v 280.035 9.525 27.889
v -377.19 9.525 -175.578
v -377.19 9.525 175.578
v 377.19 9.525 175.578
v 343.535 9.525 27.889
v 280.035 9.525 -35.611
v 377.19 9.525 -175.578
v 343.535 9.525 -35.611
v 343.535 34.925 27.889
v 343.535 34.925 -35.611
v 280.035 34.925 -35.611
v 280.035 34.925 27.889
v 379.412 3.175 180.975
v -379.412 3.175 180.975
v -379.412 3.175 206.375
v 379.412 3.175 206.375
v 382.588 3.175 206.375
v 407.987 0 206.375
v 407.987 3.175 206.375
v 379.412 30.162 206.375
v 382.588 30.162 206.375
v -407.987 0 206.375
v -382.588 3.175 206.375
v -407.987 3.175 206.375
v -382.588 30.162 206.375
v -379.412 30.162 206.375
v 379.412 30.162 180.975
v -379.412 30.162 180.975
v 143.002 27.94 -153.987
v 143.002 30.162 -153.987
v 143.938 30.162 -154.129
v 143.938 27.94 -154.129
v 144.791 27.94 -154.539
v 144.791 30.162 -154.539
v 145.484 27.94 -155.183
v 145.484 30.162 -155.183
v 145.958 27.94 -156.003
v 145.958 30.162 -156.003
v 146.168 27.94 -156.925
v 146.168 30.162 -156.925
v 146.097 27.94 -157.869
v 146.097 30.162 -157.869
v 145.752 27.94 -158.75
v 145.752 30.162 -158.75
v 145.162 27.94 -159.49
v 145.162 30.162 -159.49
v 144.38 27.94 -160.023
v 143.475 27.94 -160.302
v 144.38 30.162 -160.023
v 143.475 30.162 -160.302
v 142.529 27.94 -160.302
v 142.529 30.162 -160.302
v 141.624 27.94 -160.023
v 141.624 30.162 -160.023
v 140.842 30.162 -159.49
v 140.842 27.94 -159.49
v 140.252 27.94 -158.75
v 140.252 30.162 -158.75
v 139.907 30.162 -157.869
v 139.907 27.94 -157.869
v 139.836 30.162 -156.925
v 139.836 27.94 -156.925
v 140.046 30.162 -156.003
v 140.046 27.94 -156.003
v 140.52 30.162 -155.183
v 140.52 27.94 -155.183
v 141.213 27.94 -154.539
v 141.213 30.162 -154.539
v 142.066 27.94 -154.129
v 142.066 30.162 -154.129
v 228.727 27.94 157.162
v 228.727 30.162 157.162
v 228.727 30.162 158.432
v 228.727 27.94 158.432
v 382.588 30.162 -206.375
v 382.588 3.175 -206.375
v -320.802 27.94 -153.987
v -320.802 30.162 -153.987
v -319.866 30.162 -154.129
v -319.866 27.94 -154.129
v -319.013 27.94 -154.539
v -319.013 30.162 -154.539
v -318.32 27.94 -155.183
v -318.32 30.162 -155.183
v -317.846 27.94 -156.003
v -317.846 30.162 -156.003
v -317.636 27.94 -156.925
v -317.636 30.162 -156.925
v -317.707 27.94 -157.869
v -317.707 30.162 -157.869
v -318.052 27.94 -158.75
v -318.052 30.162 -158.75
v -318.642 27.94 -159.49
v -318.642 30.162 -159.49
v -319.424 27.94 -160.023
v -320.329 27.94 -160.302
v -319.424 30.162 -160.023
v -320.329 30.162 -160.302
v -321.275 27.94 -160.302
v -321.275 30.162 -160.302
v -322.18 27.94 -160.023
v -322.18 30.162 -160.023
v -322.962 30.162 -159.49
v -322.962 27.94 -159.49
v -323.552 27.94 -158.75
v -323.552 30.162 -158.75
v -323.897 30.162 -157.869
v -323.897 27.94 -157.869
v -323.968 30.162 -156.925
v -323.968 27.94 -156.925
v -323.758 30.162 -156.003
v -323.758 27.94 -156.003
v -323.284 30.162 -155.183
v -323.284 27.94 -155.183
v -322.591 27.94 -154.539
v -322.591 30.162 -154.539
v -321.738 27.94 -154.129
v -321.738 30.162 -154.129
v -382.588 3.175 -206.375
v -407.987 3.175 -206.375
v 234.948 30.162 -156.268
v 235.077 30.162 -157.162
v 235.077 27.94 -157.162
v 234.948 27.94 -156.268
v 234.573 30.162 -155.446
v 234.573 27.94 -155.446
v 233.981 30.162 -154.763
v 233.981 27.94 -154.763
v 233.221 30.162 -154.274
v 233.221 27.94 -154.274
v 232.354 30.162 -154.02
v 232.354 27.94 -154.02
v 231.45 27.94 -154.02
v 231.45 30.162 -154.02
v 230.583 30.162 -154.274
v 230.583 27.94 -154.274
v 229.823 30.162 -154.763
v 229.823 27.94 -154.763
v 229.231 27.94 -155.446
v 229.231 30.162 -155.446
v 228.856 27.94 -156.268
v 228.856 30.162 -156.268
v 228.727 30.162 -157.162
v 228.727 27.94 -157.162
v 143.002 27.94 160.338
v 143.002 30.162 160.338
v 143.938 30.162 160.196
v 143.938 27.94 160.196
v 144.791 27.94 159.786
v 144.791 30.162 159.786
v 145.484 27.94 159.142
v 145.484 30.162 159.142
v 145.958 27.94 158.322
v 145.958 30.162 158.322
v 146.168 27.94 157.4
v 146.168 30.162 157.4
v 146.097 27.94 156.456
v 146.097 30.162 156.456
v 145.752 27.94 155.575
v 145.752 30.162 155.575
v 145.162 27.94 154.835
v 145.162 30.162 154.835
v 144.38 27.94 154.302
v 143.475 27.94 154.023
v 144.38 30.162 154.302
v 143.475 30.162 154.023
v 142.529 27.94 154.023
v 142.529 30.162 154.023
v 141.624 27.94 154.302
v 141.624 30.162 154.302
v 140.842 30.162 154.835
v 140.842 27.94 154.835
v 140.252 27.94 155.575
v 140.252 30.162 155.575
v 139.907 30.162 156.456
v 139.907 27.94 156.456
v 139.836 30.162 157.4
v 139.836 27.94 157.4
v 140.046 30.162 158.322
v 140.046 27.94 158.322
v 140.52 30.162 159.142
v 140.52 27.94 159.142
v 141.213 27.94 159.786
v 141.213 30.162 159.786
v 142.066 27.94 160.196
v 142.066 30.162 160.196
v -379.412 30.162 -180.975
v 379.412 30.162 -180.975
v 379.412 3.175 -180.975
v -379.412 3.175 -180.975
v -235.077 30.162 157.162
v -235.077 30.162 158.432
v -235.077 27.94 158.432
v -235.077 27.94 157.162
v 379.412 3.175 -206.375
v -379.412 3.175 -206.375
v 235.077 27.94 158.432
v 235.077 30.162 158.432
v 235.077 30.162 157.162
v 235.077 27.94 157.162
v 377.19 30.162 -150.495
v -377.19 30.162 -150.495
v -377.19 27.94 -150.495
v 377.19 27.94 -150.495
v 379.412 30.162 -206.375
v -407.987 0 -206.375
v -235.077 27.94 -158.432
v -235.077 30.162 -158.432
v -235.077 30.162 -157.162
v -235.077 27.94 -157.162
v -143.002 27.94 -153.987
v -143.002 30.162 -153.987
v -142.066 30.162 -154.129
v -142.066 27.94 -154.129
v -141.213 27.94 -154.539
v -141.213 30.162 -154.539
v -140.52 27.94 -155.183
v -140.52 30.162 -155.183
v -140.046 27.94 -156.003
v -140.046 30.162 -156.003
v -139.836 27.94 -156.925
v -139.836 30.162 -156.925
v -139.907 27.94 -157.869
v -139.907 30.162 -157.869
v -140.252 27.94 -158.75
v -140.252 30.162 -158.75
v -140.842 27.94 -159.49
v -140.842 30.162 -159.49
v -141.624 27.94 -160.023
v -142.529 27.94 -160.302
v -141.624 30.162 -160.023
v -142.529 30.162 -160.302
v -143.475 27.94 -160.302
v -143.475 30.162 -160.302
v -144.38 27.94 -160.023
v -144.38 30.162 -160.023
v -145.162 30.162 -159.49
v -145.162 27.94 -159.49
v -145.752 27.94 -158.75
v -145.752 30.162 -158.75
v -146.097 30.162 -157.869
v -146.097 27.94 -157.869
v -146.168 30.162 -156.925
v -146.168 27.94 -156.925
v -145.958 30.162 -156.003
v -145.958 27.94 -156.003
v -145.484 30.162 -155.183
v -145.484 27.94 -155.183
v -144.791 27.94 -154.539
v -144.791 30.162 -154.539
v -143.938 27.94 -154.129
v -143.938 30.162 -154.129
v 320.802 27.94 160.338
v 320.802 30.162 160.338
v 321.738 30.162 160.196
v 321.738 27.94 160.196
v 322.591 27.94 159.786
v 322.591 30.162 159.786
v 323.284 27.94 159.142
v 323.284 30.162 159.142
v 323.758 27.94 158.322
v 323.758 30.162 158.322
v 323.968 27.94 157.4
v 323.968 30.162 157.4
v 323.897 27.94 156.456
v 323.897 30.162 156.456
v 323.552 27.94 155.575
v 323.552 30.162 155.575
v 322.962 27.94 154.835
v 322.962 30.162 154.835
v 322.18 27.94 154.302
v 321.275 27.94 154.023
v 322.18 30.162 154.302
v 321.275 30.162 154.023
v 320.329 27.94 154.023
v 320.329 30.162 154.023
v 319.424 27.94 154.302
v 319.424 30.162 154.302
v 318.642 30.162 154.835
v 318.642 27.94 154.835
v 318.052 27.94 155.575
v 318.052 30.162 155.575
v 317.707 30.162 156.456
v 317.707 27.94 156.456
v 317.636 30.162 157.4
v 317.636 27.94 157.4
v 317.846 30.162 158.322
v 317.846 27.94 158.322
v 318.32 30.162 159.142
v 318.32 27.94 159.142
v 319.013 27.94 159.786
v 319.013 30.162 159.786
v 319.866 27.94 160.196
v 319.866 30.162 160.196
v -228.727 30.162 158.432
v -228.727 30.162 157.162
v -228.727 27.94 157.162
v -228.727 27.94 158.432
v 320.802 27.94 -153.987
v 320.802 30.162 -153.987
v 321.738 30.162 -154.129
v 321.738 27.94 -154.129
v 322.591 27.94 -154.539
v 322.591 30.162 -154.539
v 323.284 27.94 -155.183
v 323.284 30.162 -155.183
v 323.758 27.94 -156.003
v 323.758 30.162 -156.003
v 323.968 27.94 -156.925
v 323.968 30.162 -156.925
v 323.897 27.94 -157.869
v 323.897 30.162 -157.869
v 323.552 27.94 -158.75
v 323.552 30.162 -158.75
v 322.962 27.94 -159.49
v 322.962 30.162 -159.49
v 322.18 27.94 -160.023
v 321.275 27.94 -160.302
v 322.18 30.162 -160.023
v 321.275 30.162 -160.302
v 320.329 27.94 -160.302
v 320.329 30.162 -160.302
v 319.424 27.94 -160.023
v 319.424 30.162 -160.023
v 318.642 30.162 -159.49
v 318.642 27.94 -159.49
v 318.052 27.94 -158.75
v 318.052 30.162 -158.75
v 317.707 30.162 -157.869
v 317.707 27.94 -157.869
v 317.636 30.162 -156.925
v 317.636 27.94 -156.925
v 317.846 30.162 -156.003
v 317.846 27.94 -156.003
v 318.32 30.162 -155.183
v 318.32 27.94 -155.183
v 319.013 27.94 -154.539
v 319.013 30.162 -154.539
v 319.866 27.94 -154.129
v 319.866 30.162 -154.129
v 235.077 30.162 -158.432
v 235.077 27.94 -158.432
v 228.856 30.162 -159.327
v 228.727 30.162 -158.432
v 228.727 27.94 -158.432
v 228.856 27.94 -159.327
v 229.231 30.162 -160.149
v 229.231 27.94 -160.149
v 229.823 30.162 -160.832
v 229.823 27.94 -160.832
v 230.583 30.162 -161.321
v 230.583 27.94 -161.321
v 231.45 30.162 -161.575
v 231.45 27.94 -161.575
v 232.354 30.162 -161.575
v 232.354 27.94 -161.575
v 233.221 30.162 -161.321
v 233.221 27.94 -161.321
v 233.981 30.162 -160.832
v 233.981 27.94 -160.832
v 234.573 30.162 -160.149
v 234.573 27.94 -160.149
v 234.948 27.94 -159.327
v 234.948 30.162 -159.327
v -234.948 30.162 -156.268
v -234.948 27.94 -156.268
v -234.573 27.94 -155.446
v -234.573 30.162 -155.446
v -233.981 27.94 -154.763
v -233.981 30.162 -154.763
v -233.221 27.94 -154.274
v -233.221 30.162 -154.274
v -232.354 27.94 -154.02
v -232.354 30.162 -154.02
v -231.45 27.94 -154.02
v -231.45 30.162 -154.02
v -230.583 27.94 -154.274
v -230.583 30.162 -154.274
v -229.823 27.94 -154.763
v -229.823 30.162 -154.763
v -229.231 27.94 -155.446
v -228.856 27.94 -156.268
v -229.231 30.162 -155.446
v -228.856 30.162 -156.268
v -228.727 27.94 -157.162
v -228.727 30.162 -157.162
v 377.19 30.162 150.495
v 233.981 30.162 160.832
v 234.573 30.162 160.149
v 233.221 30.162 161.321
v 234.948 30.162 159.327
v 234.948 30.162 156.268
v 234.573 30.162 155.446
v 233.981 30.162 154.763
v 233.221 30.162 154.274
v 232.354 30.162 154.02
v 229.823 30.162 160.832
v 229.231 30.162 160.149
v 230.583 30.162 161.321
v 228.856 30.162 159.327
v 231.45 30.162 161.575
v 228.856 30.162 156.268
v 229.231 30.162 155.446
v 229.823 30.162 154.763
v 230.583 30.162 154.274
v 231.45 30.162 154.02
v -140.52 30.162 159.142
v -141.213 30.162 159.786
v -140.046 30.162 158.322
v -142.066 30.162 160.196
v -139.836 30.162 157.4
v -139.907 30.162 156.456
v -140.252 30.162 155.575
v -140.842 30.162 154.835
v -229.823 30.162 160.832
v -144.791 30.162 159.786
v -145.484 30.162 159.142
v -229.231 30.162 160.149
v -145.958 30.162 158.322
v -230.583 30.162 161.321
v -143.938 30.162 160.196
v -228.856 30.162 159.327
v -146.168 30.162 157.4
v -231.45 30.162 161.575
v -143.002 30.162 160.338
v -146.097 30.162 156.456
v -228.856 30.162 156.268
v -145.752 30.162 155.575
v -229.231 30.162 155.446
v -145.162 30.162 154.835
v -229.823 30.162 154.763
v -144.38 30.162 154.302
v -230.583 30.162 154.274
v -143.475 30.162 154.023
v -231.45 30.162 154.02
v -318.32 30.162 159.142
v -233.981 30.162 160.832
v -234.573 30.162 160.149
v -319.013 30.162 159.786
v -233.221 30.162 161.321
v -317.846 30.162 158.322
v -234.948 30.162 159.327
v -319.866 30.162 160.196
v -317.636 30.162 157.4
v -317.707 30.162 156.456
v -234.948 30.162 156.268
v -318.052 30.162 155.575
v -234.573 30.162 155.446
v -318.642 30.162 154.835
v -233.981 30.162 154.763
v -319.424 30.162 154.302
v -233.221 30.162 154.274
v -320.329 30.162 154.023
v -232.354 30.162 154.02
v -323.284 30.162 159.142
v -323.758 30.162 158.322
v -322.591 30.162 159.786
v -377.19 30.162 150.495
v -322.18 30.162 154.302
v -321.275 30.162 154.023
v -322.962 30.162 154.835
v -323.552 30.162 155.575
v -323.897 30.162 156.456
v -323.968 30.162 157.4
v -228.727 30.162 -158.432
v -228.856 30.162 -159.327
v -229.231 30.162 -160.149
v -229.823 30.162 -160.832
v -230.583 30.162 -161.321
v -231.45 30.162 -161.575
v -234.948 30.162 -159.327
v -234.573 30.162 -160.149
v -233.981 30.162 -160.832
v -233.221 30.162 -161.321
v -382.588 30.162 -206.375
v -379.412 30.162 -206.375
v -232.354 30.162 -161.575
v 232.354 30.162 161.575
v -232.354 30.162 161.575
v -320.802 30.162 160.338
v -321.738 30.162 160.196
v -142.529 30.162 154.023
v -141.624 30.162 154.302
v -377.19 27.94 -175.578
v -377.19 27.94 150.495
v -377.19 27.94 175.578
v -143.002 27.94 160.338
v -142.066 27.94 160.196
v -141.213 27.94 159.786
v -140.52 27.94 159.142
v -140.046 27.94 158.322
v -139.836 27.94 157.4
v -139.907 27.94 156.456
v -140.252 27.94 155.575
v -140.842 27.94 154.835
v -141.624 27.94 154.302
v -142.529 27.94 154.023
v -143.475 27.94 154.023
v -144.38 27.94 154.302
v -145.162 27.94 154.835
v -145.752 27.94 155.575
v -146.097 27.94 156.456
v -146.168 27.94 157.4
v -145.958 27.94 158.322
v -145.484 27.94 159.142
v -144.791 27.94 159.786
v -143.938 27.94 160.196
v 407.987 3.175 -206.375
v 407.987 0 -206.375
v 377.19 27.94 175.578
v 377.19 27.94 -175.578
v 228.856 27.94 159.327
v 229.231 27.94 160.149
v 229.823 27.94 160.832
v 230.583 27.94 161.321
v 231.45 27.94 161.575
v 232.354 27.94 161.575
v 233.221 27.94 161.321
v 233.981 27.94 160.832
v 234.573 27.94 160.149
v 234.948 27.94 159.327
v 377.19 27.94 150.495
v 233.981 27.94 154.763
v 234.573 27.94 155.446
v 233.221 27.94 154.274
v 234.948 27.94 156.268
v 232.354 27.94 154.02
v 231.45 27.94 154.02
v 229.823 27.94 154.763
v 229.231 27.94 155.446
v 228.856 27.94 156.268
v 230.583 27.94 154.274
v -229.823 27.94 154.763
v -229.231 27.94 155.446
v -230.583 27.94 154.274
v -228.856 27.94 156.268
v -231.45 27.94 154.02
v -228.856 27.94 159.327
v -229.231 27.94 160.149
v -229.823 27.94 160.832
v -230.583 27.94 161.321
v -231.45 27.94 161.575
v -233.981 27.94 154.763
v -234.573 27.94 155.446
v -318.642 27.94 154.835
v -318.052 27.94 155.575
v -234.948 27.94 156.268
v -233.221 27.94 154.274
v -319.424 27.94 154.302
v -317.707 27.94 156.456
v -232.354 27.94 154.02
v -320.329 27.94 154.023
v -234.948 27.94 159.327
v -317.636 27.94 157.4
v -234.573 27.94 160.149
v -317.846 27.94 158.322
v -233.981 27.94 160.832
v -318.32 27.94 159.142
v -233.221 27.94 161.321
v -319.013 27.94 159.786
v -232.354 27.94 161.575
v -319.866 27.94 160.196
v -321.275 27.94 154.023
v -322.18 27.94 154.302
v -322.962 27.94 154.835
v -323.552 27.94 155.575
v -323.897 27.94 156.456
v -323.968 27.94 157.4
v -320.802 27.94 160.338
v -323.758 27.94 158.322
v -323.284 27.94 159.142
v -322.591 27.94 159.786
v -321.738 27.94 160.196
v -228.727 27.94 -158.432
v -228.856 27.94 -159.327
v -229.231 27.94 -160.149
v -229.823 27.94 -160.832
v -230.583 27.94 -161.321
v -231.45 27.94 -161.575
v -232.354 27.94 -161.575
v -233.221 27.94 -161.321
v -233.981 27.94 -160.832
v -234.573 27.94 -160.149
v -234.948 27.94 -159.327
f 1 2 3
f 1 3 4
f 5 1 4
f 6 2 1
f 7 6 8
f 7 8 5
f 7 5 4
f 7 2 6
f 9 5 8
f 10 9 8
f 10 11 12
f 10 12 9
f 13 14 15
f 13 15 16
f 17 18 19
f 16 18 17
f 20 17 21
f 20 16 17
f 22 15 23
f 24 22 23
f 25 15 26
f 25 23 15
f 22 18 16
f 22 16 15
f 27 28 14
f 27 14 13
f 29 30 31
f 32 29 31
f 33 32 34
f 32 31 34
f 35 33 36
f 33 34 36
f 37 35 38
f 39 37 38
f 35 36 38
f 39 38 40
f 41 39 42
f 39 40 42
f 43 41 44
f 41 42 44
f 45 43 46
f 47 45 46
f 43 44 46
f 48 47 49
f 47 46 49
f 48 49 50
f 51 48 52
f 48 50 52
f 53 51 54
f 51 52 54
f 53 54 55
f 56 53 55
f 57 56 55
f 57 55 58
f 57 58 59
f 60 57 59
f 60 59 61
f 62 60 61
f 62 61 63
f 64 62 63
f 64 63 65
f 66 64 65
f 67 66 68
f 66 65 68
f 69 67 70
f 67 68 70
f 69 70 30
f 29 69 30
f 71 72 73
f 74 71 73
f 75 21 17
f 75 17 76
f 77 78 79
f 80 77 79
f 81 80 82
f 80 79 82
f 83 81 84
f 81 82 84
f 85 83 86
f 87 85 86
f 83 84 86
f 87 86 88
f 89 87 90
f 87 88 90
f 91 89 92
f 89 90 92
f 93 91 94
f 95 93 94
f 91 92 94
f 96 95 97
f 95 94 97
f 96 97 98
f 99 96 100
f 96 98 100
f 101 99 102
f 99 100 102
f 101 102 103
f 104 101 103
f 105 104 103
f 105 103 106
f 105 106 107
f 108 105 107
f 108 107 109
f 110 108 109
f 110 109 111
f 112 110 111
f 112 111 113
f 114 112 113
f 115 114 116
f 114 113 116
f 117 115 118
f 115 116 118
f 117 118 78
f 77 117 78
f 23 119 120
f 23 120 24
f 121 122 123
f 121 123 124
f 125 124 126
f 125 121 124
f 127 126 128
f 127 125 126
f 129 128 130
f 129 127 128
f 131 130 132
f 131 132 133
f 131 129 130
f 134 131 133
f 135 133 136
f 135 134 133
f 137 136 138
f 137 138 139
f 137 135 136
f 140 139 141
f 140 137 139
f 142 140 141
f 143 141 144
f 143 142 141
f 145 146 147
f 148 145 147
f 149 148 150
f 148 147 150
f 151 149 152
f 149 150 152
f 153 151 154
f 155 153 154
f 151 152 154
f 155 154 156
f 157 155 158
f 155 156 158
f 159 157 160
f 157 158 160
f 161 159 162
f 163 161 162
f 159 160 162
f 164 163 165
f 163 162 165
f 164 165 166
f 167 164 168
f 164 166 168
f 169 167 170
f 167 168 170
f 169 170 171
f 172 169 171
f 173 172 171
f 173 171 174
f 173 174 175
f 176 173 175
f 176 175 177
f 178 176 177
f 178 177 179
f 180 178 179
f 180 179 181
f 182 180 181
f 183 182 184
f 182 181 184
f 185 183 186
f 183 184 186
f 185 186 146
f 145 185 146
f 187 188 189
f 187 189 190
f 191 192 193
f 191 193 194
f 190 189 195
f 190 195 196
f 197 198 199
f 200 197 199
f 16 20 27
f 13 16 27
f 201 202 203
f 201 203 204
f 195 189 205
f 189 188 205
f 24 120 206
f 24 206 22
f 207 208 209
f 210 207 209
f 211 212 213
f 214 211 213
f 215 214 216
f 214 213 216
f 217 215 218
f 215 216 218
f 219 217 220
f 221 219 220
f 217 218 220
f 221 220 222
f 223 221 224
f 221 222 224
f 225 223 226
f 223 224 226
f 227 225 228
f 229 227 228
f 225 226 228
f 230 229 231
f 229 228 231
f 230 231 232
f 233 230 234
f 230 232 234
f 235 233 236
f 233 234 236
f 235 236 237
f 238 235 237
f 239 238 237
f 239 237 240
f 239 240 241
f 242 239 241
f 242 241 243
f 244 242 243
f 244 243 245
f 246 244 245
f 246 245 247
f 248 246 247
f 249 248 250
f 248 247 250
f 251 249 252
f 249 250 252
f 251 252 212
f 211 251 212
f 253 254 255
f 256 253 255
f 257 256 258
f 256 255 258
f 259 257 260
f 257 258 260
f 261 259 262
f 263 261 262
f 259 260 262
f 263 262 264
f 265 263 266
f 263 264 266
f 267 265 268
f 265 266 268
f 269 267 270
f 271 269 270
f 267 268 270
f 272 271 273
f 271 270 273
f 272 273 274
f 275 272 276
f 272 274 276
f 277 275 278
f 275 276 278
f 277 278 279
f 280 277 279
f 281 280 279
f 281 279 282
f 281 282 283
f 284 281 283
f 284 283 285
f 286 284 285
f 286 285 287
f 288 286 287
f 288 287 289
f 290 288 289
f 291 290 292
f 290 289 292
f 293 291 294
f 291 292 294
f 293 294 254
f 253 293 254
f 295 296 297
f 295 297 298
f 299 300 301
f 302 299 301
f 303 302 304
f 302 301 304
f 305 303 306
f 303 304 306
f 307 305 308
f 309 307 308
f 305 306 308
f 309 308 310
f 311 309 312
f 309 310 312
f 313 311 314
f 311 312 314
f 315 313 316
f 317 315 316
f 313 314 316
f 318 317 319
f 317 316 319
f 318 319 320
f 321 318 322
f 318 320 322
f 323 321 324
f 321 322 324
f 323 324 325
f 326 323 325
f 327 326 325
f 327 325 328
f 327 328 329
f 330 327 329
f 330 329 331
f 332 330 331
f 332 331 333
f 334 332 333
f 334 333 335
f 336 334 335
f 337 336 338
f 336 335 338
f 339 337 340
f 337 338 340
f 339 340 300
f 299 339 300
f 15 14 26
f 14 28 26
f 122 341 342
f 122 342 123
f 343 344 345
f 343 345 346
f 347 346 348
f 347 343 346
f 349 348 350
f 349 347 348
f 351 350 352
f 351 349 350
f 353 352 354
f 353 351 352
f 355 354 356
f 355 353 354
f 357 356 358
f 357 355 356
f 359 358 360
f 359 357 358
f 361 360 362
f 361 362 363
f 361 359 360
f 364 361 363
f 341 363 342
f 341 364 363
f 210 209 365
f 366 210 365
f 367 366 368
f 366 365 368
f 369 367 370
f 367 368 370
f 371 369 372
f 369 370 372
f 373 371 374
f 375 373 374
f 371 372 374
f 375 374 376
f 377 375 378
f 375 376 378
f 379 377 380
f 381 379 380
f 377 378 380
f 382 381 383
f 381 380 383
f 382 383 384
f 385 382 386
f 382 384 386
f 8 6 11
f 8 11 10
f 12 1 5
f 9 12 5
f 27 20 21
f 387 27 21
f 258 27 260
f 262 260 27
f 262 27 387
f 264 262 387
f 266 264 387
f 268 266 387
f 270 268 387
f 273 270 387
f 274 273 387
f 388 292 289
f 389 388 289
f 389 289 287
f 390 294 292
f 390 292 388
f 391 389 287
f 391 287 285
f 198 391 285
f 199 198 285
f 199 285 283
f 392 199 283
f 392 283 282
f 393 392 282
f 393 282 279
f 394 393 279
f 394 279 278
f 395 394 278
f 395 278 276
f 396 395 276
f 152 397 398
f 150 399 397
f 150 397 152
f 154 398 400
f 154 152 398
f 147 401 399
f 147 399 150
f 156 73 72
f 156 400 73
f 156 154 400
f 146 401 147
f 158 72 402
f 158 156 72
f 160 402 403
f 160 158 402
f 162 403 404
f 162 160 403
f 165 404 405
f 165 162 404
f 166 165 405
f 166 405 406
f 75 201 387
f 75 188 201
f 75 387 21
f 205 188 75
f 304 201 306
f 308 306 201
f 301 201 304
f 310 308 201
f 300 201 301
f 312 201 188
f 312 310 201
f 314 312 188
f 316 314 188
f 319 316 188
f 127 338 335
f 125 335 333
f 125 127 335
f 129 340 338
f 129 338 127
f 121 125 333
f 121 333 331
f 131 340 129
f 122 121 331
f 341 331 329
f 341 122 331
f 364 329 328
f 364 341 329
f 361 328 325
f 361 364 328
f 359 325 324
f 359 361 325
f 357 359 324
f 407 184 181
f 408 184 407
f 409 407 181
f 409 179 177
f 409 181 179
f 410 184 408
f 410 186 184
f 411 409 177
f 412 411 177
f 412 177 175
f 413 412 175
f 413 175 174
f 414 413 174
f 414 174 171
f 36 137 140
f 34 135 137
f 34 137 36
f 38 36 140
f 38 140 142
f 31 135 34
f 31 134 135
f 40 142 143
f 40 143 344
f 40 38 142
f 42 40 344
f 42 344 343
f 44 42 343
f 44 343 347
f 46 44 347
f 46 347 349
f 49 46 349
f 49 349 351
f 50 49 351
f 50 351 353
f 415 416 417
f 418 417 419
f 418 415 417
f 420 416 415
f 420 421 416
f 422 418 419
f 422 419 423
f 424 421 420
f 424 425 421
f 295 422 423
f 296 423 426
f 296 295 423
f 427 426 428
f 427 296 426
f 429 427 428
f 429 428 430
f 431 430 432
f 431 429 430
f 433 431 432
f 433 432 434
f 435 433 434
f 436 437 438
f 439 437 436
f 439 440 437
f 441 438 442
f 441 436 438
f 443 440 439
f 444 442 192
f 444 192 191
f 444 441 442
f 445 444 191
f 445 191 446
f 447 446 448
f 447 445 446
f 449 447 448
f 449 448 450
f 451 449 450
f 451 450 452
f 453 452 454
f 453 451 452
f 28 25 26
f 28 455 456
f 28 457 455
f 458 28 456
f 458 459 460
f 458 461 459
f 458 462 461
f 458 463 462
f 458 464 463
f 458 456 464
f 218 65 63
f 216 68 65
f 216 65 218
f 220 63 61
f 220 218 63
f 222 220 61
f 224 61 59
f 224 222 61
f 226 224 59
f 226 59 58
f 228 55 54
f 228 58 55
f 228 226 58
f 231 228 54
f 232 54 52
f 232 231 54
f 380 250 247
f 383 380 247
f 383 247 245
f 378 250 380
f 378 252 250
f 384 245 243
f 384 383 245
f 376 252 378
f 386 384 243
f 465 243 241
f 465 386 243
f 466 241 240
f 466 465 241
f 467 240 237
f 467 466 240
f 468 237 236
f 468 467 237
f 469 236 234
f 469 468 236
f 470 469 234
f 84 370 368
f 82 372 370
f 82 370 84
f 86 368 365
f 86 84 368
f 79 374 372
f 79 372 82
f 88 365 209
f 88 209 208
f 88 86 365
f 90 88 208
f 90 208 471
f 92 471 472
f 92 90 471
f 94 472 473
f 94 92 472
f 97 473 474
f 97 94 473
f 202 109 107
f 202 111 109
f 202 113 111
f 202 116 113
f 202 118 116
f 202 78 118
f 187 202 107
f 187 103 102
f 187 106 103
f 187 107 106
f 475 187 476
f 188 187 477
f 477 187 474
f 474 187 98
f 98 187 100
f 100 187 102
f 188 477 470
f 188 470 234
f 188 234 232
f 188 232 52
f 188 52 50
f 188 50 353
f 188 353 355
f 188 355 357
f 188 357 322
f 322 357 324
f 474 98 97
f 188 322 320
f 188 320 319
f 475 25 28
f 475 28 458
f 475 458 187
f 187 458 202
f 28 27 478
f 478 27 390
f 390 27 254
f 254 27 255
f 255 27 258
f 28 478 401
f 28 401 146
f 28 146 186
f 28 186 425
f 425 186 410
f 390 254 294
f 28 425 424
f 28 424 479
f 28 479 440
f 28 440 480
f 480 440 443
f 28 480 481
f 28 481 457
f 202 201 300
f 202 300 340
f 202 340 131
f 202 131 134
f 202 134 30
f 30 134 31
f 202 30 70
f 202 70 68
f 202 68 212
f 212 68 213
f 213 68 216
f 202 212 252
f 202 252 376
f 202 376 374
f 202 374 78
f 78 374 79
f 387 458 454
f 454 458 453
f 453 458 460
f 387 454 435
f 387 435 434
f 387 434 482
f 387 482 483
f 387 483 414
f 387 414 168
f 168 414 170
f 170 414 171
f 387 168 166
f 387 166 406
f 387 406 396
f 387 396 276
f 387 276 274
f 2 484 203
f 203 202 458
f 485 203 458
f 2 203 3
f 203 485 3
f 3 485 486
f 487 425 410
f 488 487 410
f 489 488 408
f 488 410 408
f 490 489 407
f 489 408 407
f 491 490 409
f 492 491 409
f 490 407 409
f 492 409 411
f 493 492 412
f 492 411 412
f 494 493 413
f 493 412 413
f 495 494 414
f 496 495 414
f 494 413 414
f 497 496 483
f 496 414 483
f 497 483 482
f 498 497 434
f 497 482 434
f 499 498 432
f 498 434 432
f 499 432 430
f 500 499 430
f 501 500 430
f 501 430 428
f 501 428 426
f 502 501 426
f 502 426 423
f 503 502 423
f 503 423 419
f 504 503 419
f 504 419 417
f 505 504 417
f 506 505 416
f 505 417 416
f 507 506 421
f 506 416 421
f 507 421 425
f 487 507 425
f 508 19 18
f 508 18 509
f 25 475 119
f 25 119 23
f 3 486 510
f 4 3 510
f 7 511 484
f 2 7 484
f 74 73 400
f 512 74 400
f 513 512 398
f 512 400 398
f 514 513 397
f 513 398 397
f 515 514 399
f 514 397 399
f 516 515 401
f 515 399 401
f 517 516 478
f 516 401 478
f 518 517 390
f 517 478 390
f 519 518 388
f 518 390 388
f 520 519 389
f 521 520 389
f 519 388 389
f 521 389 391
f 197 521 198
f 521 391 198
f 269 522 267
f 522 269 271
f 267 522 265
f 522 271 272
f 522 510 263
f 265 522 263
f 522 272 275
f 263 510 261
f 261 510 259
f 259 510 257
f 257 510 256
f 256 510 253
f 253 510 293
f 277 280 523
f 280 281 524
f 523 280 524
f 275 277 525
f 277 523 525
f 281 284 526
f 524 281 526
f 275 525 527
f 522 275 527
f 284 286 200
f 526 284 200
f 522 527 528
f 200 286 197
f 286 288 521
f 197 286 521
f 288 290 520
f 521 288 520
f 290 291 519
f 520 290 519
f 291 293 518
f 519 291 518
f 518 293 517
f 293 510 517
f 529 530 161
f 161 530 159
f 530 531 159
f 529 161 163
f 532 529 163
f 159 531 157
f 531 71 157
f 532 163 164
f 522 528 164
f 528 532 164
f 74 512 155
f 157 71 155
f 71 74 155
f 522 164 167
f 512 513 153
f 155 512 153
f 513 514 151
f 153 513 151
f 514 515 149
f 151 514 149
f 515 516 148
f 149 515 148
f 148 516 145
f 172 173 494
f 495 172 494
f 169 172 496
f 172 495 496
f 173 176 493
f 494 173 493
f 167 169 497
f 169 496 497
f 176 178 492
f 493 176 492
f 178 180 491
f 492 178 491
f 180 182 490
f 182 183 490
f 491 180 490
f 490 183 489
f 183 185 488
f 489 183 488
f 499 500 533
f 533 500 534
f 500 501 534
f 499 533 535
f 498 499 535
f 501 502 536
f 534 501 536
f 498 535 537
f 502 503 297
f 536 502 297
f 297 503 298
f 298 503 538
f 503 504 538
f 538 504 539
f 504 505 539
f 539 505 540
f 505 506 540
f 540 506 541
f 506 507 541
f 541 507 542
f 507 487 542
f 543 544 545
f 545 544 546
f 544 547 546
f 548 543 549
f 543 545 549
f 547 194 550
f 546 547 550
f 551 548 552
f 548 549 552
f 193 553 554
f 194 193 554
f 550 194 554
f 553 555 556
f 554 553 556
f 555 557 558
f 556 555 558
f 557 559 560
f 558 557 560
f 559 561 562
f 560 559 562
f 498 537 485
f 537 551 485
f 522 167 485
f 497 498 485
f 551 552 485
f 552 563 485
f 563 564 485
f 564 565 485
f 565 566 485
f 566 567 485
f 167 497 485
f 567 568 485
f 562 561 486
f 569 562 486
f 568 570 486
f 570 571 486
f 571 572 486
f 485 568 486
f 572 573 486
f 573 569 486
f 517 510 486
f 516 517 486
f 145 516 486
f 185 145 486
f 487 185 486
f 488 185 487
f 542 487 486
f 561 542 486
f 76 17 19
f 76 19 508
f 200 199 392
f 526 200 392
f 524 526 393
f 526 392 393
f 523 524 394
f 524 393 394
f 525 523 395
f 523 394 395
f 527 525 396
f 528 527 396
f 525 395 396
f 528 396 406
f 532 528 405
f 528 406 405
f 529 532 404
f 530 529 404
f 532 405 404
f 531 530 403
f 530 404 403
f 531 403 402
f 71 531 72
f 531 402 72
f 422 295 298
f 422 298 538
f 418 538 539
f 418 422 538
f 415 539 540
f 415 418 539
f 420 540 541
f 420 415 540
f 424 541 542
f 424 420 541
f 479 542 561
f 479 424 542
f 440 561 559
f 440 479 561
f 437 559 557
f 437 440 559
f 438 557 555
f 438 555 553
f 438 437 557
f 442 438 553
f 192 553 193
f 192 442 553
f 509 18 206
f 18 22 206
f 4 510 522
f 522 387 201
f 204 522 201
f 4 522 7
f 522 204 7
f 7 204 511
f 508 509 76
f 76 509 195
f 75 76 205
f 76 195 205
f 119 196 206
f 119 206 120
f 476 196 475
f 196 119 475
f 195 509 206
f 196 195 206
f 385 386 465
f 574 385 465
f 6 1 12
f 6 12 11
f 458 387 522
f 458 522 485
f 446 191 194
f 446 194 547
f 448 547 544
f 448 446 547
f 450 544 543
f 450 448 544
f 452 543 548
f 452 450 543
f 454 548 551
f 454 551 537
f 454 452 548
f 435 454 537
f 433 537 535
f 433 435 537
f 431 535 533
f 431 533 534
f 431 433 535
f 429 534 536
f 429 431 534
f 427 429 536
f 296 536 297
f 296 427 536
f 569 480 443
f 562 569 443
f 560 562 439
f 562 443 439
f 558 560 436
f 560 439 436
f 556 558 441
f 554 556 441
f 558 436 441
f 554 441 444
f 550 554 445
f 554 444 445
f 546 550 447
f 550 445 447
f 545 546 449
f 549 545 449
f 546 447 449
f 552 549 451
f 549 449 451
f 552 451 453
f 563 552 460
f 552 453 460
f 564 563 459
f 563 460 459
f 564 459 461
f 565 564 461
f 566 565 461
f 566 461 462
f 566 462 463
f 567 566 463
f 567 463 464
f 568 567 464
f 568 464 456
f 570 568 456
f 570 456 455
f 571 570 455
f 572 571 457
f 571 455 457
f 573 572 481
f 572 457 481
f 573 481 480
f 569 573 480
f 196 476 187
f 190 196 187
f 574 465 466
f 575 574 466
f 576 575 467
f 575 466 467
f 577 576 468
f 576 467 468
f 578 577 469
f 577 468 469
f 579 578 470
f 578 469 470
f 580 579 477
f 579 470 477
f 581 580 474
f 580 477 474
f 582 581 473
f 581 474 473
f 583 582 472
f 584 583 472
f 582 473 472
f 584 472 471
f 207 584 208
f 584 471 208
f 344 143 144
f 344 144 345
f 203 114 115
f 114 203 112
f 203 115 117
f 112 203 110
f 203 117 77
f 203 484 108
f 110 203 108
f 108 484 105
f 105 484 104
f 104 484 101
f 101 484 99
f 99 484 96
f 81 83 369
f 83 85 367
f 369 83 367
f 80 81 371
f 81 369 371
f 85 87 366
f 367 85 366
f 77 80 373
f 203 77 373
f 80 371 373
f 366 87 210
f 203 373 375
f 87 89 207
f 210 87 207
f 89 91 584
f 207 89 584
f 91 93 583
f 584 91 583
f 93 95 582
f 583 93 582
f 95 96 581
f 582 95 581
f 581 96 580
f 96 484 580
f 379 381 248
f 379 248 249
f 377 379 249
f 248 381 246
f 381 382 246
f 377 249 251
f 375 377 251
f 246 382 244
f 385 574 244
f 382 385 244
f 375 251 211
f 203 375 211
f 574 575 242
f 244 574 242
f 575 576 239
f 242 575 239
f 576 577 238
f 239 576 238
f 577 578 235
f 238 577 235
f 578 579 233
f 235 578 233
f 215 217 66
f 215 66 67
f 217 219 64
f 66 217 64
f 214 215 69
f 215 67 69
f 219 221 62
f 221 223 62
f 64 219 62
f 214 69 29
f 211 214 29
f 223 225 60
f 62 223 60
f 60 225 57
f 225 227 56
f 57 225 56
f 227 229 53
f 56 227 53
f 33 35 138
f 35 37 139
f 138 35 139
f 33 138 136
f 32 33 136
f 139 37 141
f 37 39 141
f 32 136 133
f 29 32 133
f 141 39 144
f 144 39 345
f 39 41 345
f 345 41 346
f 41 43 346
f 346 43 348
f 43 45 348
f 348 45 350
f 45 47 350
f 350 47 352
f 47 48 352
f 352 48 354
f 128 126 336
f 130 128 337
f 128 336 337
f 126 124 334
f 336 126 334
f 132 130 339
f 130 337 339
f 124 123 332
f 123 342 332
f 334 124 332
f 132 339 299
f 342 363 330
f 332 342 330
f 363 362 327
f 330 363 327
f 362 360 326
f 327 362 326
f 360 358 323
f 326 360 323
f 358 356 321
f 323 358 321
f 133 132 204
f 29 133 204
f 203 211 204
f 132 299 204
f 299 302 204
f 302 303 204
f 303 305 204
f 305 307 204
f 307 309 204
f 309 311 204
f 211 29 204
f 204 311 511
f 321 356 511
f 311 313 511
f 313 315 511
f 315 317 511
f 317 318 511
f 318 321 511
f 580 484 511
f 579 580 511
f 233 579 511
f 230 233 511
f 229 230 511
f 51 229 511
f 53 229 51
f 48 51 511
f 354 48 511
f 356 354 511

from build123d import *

# Parameters (mm, degrees)
SKETCH1_W            = 754.38
SKETCH1_H            = 351.155
BOSS_EXTRUDE1_DEPTH  = 9.525
SKETCH5_W            = 355.6
SKETCH5_H            = 30.1625
BOSS_EXTRUDE4_DEPTH  = 2.2225
SKETCH6_W            = 754.38
SKETCH6_H            = 30.1625
BOSS_EXTRUDE5_DEPTH  = 2.2225
SKETCH8_W            = 754.38
SKETCH8_H            = 30.1625
BOSS_EXTRUDE6_DEPTH  = 2.2225
SKETCH14_W           = 355.6
SKETCH14_H           = 30.1625
BOSS_EXTRUDE7_DEPTH  = 2.2225
SKETCH16_W           = 754.38
SKETCH16_H           = 2.2225
BOSS_EXTRUDE8_DEPTH  = 25.0825
SKETCH17_W           = 754.38
SKETCH17_H           = 2.2225
BOSS_EXTRUDE9_DEPTH  = 25.0825
CUT_EXTRUDE1_DEPTH   = 2.2225
SKETCH21_R           = 3.175
CUT_EXTRUDE3_DEPTH   = 2.2225
SKETCH22_W           = 758.825
SKETCH22_H           = 30.1625
BOSS_EXTRUDE10_DEPTH = 3.175
SKETCH23_W           = 758.825
SKETCH23_H           = 3.175
BOSS_EXTRUDE11_DEPTH = 25.4
SKETCH24_W           = 758.825
SKETCH24_H           = 30.1625
BOSS_EXTRUDE12_DEPTH = 3.175
SKETCH25_W           = 758.825
SKETCH25_H           = 3.175
BOSS_EXTRUDE13_DEPTH = 25.4
SKETCH26_W           = 412.75
SKETCH26_H           = 30.1625
BOSS_EXTRUDE14_DEPTH = 3.175
SKETCH27_W           = 412.75
SKETCH27_H           = 3.175
BOSS_EXTRUDE15_DEPTH = 25.4
SKETCH28_W           = 412.75
SKETCH28_H           = 30.1625
BOSS_EXTRUDE16_DEPTH = 3.175
SKETCH29_W           = 412.75
SKETCH29_H           = 3.175
BOSS_EXTRUDE17_DEPTH = 25.4
SKETCH30_W           = 63.5
SKETCH30_H           = 63.5
BOSS_EXTRUDE18_DEPTH = 25.4


with BuildPart() as part:
    # Sketch1 → Boss-Extrude1 (new body)
    with BuildSketch(Plane(origin=(0, 0, 0), x_dir=(1, 0, 0), z_dir=(0, 1, 0))):
        Rectangle(SKETCH1_W, SKETCH1_H)
    extrude(amount=BOSS_EXTRUDE1_DEPTH)

    # Sketch5 → Boss-Extrude4 (add)
    with BuildSketch(Plane.ZY.offset(377.19)):
        with Locations((0, 15.08125)):
            Rectangle(SKETCH5_W, SKETCH5_H)
    extrude(amount=BOSS_EXTRUDE4_DEPTH)

    # Sketch6 → Boss-Extrude5 (add)
    with BuildSketch(Plane.XY.offset(175.5775)):
        with Locations((0, 15.08125)):
            Rectangle(SKETCH6_W, SKETCH6_H)
    extrude(amount=BOSS_EXTRUDE5_DEPTH)

    # Sketch8 → Boss-Extrude6 (add)
    with BuildSketch(Plane(origin=(0, 0, -175.5775), x_dir=(-1, 0, 0), z_dir=(0, 0, -1))):
        with Locations((0, 15.08125)):
            Rectangle(SKETCH8_W, SKETCH8_H)
    extrude(amount=BOSS_EXTRUDE6_DEPTH)

    # Sketch14 → Boss-Extrude7 (add)
    with BuildSketch(Plane(origin=(377.19, 0, 0), x_dir=(0, 0, -1), z_dir=(1, 0, 0))):
        with Locations((0, 15.08125)):
            Rectangle(SKETCH14_W, SKETCH14_H)
    extrude(amount=BOSS_EXTRUDE7_DEPTH)

    # Sketch16 → Boss-Extrude8 (add)
    with BuildSketch(Plane.XY.offset(-175.5775)):
        with Locations((0, 29.05125)):
            Rectangle(SKETCH16_W, SKETCH16_H)
    extrude(amount=BOSS_EXTRUDE8_DEPTH)

    # Sketch17 → Boss-Extrude9 (add)
    with BuildSketch(Plane(origin=(0, 0, 175.5775), x_dir=(-1, 0, 0), z_dir=(0, 0, -1))):
        with Locations((0, 29.05125)):
            Rectangle(SKETCH17_W, SKETCH17_H)
    extrude(amount=BOSS_EXTRUDE9_DEPTH)

    # Sketch19 → Cut-Extrude1 (cut)
    with BuildSketch(Plane(origin=(0, 30.1625, 0), x_dir=(1, 0, 0), z_dir=(0, 1, 0))):
        with BuildLine():
            Line((-228.727, 157.1625), (-228.727, 158.4325))
            ThreePointArc((-228.727, 158.4325), (-231.902, 161.6075), (-235.077, 158.4325))
            Line((-235.077, 158.4325), (-235.077, 157.1625))
            ThreePointArc((-235.077, 157.1625), (-231.902, 153.9875), (-228.727, 157.1625))
        make_face()
        with BuildLine():
            Line((-235.077, -158.4325), (-235.077, -157.1625))
            ThreePointArc((-235.077, -157.1625), (-231.902, -153.9875), (-228.727, -157.1625))
            Line((-228.727, -157.1625), (-228.727, -158.4325))
            ThreePointArc((-228.727, -158.4325), (-231.902, -161.6075), (-235.077, -158.4325))
        make_face()
        with BuildLine():
            Line((228.727, -157.1625), (228.727, -158.4325))
            ThreePointArc((228.727, -158.4325), (231.902, -161.6075), (235.077, -158.4325))
            Line((235.077, -158.4325), (235.077, -157.1625))
            ThreePointArc((235.077, -157.1625), (231.902, -153.9875), (228.727, -157.1625))
        make_face()
        with BuildLine():
            Line((228.727, 157.1625), (228.727, 158.4325))
            ThreePointArc((228.727, 158.4325), (231.902, 161.6075), (235.077, 158.4325))
            Line((235.077, 158.4325), (235.077, 157.1625))
            ThreePointArc((235.077, 157.1625), (231.902, 153.9875), (228.727, 157.1625))
        make_face()
    extrude(amount=-CUT_EXTRUDE1_DEPTH, mode=Mode.SUBTRACT)

    # Sketch21 → Cut-Extrude3 (cut)
    with BuildSketch(Plane(origin=(0, 30.1625, 0), x_dir=(1, 0, 0), z_dir=(0, 1, 0))):
        with Locations(Location((-143.002, -157.1625, 0), (0, 0, 270))):
            Circle(SKETCH21_R)
        with Locations(Location((-143.002, 157.1625, 0), (0, 0, 270))):
            Circle(SKETCH21_R)
        with Locations(Location((-320.802, -157.1625, 0), (0, 0, 270))):
            Circle(SKETCH21_R)
        with Locations(Location((-320.802, 157.1625, 0), (0, 0, 270))):
            Circle(SKETCH21_R)
        with Locations(Location((143.002, 157.1625, 0), (0, 0, 270))):
            Circle(SKETCH21_R)
        with Locations(Location((320.802, 157.1625, 0), (0, 0, 270))):
            Circle(SKETCH21_R)
        with Locations(Location((143.002, -157.1625, 0), (0, 0, 270))):
            Circle(SKETCH21_R)
        with Locations(Location((320.802, -157.1625, 0), (0, 0, 270))):
            Circle(SKETCH21_R)
    extrude(amount=-CUT_EXTRUDE3_DEPTH, mode=Mode.SUBTRACT)

    # Sketch22 → Boss-Extrude10 (add)
    with BuildSketch(Plane.XY.offset(177.8)):
        with Locations((0, 15.08125)):
            Rectangle(SKETCH22_W, SKETCH22_H)
    extrude(amount=BOSS_EXTRUDE10_DEPTH)

    # Sketch23 → Boss-Extrude11 (add)
    with BuildSketch(Plane.XY.offset(180.975)):
        with Locations((0, 1.5875)):
            Rectangle(SKETCH23_W, SKETCH23_H)
    extrude(amount=BOSS_EXTRUDE11_DEPTH)

    # Sketch24 → Boss-Extrude12 (add)
    with BuildSketch(Plane(origin=(0, 0, -177.8), x_dir=(-1, 0, 0), z_dir=(0, 0, -1))):
        with Locations((0, 15.08125)):
            Rectangle(SKETCH24_W, SKETCH24_H)
    extrude(amount=BOSS_EXTRUDE12_DEPTH)

    # Sketch25 → Boss-Extrude13 (add)
    with BuildSketch(Plane(origin=(0, 0, -180.975), x_dir=(-1, 0, 0), z_dir=(0, 0, -1))):
        with Locations((0, 1.5875)):
            Rectangle(SKETCH25_W, SKETCH25_H)
    extrude(amount=BOSS_EXTRUDE13_DEPTH)

    # Sketch26 → Boss-Extrude14 (add)
    with BuildSketch(Plane.ZY.offset(379.4125)):
        with Locations((0, 15.08125)):
            Rectangle(SKETCH26_W, SKETCH26_H)
    extrude(amount=BOSS_EXTRUDE14_DEPTH)

    # Sketch27 → Boss-Extrude15 (add)
    with BuildSketch(Plane.ZY.offset(382.5875)):
        with Locations((0, 1.5875)):
            Rectangle(SKETCH27_W, SKETCH27_H)
    extrude(amount=BOSS_EXTRUDE15_DEPTH)

    # Sketch28 → Boss-Extrude16 (add)
    with BuildSketch(Plane(origin=(379.4125, 0, 0), x_dir=(0, 0, -1), z_dir=(1, 0, 0))):
        with Locations((0, 15.08125)):
            Rectangle(SKETCH28_W, SKETCH28_H)
    extrude(amount=BOSS_EXTRUDE16_DEPTH)

    # Sketch29 → Boss-Extrude17 (add)
    with BuildSketch(Plane(origin=(382.5875, 0, 0), x_dir=(0, 0, -1), z_dir=(1, 0, 0))):
        with Locations((0, 1.5875)):
            Rectangle(SKETCH29_W, SKETCH29_H)
    extrude(amount=BOSS_EXTRUDE17_DEPTH)

    # Sketch30 → Boss-Extrude18 (add)
    with BuildSketch(Plane(origin=(0, 9.525, 0), x_dir=(1, 0, 0), z_dir=(0, 1, 0))):
        with Locations((311.785, 3.861461092)):
            Rectangle(SKETCH30_W, SKETCH30_H)
    extrude(amount=BOSS_EXTRUDE18_DEPTH)


solid = part.part
